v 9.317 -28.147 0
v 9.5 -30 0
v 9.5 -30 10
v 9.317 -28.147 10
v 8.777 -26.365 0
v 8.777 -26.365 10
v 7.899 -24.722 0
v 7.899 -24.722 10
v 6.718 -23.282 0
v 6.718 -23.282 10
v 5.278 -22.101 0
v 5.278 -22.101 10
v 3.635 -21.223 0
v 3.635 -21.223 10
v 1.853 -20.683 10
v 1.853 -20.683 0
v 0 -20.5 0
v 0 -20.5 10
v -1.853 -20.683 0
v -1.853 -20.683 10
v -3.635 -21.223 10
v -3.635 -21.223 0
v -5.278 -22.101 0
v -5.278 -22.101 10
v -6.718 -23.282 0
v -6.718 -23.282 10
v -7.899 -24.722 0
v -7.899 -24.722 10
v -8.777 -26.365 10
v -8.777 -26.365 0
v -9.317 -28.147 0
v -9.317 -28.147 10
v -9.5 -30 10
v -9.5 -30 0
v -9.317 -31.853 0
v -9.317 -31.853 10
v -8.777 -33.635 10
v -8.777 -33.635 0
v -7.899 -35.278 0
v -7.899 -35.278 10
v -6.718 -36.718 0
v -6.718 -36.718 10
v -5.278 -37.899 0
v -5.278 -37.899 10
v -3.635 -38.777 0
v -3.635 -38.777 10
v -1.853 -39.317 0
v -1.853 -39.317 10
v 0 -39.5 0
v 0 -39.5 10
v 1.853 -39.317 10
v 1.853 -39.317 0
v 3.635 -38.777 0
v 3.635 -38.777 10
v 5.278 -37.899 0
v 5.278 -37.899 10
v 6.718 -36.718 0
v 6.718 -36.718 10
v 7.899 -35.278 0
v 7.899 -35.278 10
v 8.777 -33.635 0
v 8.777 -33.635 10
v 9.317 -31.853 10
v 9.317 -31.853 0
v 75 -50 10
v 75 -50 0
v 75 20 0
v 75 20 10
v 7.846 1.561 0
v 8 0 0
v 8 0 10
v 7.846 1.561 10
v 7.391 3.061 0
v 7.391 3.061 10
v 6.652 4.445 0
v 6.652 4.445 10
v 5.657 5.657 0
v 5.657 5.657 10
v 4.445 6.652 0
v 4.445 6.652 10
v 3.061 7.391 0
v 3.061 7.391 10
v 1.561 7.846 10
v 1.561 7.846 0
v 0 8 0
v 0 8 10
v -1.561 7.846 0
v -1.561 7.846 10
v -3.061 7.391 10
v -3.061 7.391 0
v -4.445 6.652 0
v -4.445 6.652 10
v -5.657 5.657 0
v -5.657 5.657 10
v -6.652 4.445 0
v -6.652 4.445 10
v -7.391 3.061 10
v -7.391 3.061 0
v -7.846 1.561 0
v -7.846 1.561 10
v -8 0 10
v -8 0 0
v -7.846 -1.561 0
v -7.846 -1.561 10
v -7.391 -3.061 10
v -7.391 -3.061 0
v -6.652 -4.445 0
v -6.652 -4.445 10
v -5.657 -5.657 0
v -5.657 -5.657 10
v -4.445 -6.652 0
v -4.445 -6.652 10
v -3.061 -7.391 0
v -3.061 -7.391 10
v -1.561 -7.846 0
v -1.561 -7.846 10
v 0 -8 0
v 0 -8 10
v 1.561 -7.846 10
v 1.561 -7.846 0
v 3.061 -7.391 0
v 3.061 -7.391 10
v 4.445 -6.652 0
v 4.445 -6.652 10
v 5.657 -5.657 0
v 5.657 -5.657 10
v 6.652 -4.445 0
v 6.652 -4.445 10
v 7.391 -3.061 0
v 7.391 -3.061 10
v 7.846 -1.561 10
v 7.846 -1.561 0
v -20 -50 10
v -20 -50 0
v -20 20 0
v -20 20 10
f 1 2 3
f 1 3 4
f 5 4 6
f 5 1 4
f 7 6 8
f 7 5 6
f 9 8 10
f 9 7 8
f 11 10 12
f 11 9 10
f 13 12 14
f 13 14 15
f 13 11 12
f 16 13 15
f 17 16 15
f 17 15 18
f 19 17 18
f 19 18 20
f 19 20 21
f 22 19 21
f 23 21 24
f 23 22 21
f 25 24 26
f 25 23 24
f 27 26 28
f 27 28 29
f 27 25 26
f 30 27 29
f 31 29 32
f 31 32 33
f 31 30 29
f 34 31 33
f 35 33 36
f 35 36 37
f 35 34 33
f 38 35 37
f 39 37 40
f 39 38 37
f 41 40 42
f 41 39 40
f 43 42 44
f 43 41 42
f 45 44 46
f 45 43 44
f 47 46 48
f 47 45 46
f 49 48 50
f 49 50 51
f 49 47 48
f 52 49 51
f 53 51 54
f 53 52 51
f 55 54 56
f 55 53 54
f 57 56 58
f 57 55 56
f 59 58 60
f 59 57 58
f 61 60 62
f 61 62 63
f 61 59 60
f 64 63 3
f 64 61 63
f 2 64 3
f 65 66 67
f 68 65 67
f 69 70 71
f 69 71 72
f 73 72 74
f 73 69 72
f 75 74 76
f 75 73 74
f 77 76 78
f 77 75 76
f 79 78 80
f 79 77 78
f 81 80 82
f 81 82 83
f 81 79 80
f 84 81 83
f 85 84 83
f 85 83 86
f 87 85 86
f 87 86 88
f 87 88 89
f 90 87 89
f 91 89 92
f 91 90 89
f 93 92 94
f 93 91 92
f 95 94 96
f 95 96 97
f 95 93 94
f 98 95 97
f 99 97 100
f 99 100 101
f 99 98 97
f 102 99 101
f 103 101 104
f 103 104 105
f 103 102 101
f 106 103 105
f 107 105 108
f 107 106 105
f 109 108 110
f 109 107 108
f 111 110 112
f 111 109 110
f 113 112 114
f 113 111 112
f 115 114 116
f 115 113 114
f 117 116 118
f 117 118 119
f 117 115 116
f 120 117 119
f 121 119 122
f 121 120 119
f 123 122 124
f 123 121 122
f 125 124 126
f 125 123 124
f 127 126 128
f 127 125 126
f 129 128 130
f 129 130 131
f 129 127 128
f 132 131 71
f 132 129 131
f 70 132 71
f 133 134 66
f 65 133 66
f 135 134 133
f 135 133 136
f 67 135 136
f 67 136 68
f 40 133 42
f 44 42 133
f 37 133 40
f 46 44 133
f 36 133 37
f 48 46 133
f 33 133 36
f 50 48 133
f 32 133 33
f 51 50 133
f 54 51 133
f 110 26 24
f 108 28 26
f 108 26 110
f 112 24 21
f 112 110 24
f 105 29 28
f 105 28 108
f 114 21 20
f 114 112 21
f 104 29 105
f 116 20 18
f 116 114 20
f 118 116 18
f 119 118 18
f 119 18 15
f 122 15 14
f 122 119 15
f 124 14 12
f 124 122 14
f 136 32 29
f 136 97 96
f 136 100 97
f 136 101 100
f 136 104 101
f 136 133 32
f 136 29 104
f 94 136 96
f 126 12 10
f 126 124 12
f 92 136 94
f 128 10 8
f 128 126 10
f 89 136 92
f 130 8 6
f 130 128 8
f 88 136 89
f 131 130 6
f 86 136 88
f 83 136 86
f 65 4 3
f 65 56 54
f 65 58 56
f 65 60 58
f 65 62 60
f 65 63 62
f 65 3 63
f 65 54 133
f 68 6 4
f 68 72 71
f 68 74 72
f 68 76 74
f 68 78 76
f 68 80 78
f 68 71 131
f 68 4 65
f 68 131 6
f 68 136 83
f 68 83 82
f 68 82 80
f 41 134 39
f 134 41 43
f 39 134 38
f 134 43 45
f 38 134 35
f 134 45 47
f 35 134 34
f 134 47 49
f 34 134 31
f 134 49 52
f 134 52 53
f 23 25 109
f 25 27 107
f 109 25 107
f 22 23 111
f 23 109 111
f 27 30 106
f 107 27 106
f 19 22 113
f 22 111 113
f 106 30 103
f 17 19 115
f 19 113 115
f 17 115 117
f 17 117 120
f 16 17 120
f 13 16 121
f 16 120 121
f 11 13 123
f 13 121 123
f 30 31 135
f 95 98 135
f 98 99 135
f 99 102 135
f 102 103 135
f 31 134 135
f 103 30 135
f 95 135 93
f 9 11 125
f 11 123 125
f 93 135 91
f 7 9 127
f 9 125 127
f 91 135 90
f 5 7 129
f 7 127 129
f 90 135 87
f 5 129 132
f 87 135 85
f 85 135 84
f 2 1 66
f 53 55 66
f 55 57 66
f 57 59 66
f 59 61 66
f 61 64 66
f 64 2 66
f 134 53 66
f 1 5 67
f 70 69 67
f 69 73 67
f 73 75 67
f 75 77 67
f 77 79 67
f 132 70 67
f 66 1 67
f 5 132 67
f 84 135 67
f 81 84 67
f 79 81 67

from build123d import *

# Parameters (mm, degrees)
SKETCH_W   = 95
SKETCH_H   = 70
SKETCH_R   = 8
SKETCH_R_2 = 9.5
PAD_DEPTH  = 10


with BuildPart() as part:
    # Sketch → Pad (new body)
    with BuildSketch(Plane.XY):
        with Locations((27.5, -15)):
            Rectangle(SKETCH_W, SKETCH_H)
        Circle(SKETCH_R, mode=Mode.SUBTRACT)
        with Locations((0, -30)):
            Circle(SKETCH_R_2, mode=Mode.SUBTRACT)
    extrude(amount=PAD_DEPTH)


solid = part.part
